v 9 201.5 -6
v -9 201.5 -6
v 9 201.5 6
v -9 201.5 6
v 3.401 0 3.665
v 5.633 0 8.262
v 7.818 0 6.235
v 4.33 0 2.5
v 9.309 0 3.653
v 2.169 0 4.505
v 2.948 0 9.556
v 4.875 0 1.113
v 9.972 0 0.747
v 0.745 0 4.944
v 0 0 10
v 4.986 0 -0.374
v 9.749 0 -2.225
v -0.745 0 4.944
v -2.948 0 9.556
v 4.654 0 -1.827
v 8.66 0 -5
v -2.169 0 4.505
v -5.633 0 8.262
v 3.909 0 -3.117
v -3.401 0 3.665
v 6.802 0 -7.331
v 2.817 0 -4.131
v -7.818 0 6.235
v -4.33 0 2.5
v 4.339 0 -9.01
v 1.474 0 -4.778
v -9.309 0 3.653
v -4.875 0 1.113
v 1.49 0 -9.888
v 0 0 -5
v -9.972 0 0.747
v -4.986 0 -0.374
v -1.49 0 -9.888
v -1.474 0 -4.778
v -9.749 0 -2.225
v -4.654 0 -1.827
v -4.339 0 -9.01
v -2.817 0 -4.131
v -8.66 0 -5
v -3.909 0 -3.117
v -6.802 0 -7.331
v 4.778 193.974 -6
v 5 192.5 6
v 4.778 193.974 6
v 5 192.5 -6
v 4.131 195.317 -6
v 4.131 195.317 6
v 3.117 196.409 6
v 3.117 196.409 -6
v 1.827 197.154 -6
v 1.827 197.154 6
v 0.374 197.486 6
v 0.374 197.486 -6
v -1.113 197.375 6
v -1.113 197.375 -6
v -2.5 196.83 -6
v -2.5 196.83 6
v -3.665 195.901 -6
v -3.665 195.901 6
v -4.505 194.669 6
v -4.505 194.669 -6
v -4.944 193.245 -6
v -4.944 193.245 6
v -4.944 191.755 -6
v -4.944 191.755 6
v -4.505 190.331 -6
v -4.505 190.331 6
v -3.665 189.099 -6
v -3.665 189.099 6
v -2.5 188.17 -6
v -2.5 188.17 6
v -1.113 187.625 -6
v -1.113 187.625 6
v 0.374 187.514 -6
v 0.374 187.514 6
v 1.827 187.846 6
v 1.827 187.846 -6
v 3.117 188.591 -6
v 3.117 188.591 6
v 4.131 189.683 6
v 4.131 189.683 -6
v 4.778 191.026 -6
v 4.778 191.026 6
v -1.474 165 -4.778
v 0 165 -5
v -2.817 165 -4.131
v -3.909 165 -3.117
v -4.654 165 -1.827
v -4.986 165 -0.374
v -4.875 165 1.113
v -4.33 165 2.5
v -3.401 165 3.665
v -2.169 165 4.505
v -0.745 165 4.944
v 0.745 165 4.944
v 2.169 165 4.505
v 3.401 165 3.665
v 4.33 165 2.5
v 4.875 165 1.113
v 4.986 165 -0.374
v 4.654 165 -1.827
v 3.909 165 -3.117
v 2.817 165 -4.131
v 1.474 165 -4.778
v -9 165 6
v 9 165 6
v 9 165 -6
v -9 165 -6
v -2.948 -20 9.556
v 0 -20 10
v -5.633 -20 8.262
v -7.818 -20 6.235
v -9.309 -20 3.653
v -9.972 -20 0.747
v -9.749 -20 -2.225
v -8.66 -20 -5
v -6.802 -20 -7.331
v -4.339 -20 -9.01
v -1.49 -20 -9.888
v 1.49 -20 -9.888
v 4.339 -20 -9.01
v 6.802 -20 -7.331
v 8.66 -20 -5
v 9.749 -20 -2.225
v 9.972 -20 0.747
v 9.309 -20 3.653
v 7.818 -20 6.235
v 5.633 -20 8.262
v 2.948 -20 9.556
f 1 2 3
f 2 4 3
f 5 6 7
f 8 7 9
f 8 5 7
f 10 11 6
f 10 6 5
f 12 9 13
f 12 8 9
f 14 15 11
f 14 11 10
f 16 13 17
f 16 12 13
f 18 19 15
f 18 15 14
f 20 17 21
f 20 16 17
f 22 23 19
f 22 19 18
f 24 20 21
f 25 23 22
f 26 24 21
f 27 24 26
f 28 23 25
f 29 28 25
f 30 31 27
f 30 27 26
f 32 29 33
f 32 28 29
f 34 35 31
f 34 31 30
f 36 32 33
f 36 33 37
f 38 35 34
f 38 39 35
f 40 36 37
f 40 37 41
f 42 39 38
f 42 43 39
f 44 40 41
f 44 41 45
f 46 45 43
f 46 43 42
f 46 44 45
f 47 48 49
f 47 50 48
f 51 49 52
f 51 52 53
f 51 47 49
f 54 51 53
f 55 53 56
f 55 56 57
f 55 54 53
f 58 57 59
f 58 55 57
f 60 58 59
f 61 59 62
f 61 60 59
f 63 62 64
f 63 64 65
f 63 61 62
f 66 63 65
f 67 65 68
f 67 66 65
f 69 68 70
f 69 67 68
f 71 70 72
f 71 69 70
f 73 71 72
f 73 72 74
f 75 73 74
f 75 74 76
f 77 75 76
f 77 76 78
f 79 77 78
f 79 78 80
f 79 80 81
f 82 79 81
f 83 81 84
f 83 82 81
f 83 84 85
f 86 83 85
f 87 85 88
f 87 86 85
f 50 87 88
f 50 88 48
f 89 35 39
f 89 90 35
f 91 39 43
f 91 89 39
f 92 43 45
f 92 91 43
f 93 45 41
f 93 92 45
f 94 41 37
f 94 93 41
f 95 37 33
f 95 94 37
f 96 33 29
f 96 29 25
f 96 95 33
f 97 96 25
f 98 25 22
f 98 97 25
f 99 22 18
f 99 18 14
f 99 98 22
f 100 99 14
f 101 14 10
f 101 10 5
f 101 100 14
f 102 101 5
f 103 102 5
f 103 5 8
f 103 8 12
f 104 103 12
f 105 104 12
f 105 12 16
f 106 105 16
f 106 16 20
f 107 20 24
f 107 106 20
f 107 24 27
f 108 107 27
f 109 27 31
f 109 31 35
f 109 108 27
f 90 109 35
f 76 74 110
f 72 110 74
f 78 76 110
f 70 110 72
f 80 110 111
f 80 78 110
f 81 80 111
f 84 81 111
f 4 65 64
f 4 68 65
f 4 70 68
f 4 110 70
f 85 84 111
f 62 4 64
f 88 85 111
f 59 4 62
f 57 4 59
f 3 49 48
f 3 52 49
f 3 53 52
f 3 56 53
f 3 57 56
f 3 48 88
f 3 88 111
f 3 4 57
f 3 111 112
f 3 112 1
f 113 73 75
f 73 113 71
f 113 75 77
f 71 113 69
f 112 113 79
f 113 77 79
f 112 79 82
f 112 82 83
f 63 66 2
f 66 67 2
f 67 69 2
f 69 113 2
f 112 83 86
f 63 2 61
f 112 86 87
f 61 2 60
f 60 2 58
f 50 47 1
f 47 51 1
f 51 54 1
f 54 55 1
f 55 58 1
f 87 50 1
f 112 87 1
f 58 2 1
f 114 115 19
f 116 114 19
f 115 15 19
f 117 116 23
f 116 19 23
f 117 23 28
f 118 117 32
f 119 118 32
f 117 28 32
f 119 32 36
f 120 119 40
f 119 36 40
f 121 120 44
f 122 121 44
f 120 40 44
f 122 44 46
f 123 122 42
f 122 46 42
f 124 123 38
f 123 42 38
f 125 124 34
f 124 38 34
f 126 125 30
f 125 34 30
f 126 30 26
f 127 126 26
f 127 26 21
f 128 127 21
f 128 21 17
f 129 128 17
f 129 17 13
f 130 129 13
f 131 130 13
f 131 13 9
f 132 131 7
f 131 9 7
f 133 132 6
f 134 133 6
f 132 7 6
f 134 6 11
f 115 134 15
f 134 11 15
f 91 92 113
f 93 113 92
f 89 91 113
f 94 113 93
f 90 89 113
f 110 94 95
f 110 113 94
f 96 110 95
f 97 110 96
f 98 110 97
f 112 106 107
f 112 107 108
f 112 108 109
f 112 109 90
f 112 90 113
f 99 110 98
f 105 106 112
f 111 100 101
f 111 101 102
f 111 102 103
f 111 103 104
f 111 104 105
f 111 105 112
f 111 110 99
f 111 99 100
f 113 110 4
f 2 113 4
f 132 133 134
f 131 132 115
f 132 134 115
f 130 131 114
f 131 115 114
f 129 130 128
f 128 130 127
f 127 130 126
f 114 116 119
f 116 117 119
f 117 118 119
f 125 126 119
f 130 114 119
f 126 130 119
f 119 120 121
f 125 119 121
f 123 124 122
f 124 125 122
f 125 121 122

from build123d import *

# Parameters (mm, degrees)
ESQUISSE1_W        = 5
ESQUISSE1_H        = 165
ESQUISSE2_W        = 10
ESQUISSE2_H        = 20
ESQUISSE3_W        = 18
ESQUISSE3_H        = 36.5
ESQUISSE3_R        = 5
BOSS_EXTRU_1_DEPTH = 6


with BuildPart() as part:
    # Esquisse1 → Base-Révolution (revolve)
    with BuildSketch(Plane.XY, mode=Mode.PRIVATE) as base_r_volution_sk:
        with Locations((2.5, 82.5)):
            Rectangle(ESQUISSE1_W, ESQUISSE1_H)
    revolve(base_r_volution_sk.sketch.rotate(Axis((0, -40, 0), (0, 1, 0)), 90), axis=Axis((0, -40, 0), (0, 1, 0)))

    # Esquisse2 → Boss.-Révol.1 (revolve)
    with BuildSketch(Plane.XY, mode=Mode.PRIVATE) as boss_r_vol_1_sk:
        with Locations((5, -10)):
            Rectangle(ESQUISSE2_W, ESQUISSE2_H)
    revolve(boss_r_vol_1_sk.sketch.rotate(Axis((0, 0, 0), (0, -1, 0)), 90), axis=Axis((0, 0, 0), (0, -1, 0)))

    # Esquisse3 → Boss.-Extru.1 (add, symmetric)
    with BuildSketch(Plane.XY):
        with Locations((0, 183.25)):
            Rectangle(ESQUISSE3_W, ESQUISSE3_H)
        with Locations((0, 192.5)):
            Circle(ESQUISSE3_R, mode=Mode.SUBTRACT)
    extrude(amount=BOSS_EXTRU_1_DEPTH, both=True)


solid = part.part
